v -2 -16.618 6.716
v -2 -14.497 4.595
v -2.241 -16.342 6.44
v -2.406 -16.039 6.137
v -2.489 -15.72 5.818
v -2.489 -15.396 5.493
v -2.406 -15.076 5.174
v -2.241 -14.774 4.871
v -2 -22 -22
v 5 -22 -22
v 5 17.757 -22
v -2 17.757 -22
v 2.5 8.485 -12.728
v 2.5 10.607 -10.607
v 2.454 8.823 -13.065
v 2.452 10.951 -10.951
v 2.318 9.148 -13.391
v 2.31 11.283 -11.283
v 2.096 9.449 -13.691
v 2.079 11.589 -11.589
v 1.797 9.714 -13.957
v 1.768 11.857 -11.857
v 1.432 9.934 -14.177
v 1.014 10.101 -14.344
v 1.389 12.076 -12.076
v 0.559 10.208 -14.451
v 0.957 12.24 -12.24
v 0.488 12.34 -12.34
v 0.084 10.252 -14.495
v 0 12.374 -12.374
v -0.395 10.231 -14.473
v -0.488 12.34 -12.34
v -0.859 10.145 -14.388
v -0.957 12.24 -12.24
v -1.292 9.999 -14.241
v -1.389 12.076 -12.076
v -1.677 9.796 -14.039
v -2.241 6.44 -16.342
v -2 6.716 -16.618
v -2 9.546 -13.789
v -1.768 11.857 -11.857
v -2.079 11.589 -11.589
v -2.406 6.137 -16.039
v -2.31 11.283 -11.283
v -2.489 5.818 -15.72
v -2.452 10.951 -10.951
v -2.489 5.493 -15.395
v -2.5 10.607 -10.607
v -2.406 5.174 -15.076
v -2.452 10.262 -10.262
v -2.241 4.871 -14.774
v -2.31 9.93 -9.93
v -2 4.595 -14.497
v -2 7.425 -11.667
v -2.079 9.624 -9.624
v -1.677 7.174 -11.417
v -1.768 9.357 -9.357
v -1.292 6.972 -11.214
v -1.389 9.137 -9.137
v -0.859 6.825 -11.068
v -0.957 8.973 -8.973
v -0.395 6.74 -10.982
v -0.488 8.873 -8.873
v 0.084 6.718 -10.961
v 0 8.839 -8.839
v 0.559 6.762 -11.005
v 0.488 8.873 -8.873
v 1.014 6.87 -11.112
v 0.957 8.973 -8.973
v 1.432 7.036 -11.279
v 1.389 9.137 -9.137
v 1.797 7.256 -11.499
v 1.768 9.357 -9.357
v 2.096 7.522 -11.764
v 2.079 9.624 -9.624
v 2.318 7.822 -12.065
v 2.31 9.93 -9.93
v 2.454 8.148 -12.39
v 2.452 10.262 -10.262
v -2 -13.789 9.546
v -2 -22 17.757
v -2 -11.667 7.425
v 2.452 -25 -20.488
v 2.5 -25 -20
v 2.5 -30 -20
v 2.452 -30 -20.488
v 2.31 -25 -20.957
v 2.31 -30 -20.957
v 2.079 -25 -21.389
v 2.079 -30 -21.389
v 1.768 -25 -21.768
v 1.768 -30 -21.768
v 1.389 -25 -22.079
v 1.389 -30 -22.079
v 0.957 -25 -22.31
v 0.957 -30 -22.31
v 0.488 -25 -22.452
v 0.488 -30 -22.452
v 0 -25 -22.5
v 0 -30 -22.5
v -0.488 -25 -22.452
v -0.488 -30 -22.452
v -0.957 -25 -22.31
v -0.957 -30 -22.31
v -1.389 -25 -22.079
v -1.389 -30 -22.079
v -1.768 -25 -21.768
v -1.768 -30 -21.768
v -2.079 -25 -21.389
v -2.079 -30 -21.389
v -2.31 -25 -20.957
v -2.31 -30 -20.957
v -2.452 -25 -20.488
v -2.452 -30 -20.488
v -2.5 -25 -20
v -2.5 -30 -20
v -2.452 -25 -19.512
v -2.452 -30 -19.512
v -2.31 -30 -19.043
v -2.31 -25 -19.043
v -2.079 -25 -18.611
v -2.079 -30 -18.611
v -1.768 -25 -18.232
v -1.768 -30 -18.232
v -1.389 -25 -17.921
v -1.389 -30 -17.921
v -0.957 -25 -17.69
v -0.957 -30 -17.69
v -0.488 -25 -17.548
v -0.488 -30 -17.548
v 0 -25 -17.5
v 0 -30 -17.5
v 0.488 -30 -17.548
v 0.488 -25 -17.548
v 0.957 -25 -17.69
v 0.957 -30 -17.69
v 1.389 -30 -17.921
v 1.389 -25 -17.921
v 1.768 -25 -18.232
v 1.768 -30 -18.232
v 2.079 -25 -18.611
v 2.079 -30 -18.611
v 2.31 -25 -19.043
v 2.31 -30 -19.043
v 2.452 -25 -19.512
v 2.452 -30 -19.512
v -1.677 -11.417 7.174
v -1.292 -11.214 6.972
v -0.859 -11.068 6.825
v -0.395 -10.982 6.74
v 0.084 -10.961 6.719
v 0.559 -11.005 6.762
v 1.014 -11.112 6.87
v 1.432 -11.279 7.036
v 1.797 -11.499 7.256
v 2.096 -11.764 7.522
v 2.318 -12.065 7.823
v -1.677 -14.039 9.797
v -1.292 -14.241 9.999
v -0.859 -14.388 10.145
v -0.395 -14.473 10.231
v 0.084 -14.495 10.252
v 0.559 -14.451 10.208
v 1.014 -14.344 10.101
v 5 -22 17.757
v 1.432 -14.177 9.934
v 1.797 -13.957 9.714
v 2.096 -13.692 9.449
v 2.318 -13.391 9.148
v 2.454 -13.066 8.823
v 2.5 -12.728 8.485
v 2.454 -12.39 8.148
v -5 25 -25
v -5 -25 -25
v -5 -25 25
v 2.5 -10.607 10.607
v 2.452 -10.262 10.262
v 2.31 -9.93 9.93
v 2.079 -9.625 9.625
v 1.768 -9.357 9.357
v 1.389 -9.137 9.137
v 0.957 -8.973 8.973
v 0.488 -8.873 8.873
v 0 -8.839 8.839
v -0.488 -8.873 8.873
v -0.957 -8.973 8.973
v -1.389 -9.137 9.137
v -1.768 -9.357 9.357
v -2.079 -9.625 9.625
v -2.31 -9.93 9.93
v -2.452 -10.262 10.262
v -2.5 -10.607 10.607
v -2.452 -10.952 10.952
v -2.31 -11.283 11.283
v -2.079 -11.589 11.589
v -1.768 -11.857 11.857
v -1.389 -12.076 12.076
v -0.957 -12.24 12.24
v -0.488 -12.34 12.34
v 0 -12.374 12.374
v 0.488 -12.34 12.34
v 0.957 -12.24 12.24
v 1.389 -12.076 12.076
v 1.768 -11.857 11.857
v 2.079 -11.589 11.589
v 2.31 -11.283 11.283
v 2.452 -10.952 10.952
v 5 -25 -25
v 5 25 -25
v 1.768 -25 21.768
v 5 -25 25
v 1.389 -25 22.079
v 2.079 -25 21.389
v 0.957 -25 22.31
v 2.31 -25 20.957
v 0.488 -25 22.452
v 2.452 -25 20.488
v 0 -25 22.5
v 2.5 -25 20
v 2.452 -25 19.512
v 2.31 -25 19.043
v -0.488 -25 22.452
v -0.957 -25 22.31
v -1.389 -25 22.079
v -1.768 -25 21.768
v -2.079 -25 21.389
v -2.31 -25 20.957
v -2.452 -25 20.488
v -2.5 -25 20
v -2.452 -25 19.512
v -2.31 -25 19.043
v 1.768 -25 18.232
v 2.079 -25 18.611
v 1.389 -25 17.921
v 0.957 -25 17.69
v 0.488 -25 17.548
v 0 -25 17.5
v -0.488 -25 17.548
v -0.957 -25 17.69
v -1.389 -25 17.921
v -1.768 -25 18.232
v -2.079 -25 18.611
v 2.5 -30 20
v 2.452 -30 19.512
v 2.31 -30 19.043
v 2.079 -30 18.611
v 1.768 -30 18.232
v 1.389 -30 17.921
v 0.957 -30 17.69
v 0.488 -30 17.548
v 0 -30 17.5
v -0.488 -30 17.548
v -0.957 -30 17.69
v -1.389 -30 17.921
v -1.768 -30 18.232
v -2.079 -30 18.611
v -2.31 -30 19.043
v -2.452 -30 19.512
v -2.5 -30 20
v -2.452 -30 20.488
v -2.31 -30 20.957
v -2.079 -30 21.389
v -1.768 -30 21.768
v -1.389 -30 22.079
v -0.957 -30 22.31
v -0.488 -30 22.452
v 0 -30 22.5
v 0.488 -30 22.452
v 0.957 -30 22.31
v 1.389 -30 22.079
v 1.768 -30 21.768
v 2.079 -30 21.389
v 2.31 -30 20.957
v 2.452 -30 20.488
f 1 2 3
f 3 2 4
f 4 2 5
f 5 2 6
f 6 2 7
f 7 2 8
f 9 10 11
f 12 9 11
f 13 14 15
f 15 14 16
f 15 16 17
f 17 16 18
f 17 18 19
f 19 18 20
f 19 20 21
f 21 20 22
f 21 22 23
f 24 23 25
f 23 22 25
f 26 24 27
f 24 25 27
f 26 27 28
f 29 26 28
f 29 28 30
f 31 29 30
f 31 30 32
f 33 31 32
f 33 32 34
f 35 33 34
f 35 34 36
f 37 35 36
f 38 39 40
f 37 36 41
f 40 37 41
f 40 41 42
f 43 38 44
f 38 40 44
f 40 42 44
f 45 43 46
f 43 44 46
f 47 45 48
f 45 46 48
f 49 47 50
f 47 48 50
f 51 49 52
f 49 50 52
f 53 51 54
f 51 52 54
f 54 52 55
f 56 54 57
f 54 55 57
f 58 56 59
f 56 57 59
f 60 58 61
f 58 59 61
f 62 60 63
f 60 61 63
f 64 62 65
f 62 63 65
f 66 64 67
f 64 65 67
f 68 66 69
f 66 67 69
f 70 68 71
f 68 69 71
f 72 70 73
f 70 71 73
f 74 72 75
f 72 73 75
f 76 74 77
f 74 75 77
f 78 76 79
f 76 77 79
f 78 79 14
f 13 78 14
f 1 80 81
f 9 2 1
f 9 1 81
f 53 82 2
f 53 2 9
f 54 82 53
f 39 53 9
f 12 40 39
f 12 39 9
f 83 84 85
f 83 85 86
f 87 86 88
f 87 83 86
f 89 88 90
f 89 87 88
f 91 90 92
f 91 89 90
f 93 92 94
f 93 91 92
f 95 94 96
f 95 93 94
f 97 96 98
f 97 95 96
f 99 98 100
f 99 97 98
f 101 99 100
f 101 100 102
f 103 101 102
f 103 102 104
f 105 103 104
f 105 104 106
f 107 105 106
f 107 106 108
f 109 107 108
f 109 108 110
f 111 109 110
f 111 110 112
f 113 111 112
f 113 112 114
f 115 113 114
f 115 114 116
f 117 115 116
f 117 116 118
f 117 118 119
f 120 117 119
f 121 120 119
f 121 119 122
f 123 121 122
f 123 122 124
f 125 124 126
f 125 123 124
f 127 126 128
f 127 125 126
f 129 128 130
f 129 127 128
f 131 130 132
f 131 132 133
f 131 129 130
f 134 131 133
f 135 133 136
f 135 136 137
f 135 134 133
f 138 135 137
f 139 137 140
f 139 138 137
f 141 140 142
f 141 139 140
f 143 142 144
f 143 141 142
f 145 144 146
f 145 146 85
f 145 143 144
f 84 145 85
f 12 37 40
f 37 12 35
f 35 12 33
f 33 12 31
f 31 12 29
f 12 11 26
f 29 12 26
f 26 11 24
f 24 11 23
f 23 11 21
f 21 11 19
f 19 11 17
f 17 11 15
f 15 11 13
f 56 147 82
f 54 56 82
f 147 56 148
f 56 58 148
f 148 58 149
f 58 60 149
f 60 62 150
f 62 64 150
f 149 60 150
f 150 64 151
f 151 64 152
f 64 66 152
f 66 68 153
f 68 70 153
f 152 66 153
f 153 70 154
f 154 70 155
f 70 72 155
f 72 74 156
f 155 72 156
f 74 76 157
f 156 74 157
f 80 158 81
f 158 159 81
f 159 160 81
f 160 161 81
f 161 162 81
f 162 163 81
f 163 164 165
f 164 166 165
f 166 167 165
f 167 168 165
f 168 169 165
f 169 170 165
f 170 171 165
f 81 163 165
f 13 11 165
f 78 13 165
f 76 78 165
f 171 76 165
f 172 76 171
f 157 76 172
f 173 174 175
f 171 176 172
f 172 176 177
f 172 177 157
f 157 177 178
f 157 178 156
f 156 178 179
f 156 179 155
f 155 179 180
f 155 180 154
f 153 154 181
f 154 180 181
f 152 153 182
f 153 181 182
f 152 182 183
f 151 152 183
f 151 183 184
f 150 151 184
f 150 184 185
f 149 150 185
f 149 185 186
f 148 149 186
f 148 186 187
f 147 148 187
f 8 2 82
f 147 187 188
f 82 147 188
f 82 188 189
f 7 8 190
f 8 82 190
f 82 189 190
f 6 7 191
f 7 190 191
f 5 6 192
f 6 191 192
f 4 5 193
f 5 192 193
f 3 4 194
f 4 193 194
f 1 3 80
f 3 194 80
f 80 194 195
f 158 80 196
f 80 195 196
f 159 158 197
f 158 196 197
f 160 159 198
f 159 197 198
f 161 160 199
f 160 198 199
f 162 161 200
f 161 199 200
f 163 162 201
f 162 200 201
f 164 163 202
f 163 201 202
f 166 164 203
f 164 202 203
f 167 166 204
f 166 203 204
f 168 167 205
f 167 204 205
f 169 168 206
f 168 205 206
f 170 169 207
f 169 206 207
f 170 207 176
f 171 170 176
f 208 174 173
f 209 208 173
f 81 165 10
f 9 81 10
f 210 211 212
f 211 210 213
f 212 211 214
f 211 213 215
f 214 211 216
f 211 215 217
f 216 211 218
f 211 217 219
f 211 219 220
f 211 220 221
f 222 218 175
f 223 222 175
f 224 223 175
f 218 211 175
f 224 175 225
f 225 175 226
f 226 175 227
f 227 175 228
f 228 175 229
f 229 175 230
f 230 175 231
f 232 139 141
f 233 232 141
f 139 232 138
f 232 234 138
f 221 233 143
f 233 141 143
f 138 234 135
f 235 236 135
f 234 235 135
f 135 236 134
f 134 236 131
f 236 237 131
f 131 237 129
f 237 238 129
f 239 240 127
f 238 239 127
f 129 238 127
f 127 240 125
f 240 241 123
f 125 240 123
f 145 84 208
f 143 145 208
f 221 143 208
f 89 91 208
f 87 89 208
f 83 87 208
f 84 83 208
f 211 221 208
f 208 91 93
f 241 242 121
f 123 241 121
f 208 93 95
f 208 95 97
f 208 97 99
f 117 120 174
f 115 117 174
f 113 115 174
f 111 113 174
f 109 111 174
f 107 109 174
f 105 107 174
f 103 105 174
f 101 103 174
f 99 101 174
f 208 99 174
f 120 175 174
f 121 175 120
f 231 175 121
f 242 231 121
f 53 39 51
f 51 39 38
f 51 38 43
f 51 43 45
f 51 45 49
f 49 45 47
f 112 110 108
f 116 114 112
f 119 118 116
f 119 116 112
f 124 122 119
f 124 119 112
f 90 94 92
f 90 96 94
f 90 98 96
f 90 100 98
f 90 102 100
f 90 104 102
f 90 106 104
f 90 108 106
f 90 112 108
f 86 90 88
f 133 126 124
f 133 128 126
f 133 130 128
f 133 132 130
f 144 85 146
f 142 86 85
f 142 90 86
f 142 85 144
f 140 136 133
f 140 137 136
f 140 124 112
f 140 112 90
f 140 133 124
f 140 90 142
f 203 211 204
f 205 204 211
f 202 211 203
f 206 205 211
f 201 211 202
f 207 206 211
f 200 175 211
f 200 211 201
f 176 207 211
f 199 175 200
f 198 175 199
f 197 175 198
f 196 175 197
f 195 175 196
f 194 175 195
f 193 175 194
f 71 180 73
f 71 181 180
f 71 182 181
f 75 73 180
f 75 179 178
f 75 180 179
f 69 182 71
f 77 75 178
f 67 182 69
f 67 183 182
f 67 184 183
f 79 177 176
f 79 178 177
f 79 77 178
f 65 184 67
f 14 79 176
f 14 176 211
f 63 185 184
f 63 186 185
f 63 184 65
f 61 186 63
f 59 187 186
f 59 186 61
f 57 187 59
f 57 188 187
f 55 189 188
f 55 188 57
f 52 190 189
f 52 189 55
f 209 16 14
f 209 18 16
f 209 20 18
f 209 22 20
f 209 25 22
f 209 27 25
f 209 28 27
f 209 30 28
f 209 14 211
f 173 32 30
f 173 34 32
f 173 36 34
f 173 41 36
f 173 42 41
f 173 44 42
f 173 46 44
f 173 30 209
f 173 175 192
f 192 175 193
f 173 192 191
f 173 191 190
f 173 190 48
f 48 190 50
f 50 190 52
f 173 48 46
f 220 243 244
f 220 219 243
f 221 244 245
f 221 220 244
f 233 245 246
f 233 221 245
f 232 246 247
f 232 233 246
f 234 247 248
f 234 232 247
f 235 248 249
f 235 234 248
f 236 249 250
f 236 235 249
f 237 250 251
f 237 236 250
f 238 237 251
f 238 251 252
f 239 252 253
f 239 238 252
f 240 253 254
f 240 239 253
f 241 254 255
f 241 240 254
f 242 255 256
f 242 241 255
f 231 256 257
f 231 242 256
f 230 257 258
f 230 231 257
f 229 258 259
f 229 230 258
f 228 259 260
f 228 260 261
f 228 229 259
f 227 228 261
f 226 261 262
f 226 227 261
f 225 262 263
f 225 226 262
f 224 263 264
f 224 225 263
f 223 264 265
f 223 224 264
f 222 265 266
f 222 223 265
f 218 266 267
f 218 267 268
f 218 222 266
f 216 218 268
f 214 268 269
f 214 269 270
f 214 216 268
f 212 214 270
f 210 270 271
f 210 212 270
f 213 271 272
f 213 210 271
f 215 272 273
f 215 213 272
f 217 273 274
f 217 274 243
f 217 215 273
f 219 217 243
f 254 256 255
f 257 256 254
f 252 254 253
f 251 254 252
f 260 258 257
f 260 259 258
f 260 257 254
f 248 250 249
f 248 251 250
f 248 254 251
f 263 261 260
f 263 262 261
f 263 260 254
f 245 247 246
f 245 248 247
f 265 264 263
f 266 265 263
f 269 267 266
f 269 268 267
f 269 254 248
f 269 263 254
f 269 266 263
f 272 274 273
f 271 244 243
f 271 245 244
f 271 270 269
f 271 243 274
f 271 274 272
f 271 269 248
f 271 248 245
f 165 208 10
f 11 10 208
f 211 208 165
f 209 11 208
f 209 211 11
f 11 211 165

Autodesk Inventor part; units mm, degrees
sketch "Sketch2" plane through (0, 0, 0) normal (1, 0, 0) x (0, 1, 0)
  line L0 (25, 25) -> (-25, 25)
  line L1 (-25, 25) -> (-25, -25)
  line L2 (-25, -25) -> (25, -25)
  line L3 (25, -25) -> (25, 25)
  line L4 (-35, 0) -> (35, 0) projected
  line L5 (0, 35) -> (0, -35) projected
  line L6 (-25, 25) -> (25, -25)
  point P0 (0, 0)
  point P1 (25, 0)
  point P2 (0, 25)
  dimension "d0" = 50
  dimension "d1" = 50
extrude "Extrusion1" add sketch "Sketch2" along normal mid plane 10 contours L6 L4 L1 | L5 L2 L1 L4 | L6 L2 L5
sketch "Sketch4" plane through (5, 0, 0) normal (1, 0, 0) x (0, 0, -1)
  line L0 (25, 25) -> (-25, -25) projected
  line L1 (25, -25) -> (25, 25) projected
  line L2 (-25, -25) -> (25, -25) projected
  line L3 (22, 17.7574) -> (-17.7574, -22)
  line L4 (-17.7574, -22) -> (22, -22)
  line L5 (22, -22) -> (22, 17.7574)
  point P0 (0, 0)
  dimension "d8" = 3
extrude "Extrusion2" cut sketch "Sketch4" against normal blind 7 contours L5 L4 L3
sketch "Sketch5" plane through (-5, -25, -25) normal (0, -1, 0) x (1, 0, 0)
  line L0 (5, 60) -> (5, -10) projected
  circle A0 centre (5, 45) radius 2.5
  line L1 (10, 50) -> (0, 50) projected
  circle A1 centre (5, 5) radius 2.5
  point P0 (5, 25)
  dimension "d11" = 5
  dimension "d12" = 5
  dimension "d15" = 40
extrude "Extrusion3" add sketch "Sketch5" along normal blind 5
sketch "Sketch8" plane through (-5, -25, 25) normal (0, 0.7071, 0.7071) x (1, 0, 0)
  line L0 (10, 0) -> (0, 0) projected
  line L1 (0, 70.7107) -> (10, 70.7107) projected
  circle A0 centre (5, 50.3553) radius 2.5
  line L2 (5, 84.8528) -> (5, -14.1421) projected
  line L3 (-2, 35.3553) -> (12, 35.3553) projected
  circle A1 centre (5, 20.3553) radius 2.5
  point P0 (5, 35.3553)
  dimension "d31" = 70.7107
  dimension "d32" = 5
  dimension "d34" = 15
extrude "Extrusion4" cut sketch "Sketch8" against normal blind 7
properties part number "Roof_Wall_Small"
